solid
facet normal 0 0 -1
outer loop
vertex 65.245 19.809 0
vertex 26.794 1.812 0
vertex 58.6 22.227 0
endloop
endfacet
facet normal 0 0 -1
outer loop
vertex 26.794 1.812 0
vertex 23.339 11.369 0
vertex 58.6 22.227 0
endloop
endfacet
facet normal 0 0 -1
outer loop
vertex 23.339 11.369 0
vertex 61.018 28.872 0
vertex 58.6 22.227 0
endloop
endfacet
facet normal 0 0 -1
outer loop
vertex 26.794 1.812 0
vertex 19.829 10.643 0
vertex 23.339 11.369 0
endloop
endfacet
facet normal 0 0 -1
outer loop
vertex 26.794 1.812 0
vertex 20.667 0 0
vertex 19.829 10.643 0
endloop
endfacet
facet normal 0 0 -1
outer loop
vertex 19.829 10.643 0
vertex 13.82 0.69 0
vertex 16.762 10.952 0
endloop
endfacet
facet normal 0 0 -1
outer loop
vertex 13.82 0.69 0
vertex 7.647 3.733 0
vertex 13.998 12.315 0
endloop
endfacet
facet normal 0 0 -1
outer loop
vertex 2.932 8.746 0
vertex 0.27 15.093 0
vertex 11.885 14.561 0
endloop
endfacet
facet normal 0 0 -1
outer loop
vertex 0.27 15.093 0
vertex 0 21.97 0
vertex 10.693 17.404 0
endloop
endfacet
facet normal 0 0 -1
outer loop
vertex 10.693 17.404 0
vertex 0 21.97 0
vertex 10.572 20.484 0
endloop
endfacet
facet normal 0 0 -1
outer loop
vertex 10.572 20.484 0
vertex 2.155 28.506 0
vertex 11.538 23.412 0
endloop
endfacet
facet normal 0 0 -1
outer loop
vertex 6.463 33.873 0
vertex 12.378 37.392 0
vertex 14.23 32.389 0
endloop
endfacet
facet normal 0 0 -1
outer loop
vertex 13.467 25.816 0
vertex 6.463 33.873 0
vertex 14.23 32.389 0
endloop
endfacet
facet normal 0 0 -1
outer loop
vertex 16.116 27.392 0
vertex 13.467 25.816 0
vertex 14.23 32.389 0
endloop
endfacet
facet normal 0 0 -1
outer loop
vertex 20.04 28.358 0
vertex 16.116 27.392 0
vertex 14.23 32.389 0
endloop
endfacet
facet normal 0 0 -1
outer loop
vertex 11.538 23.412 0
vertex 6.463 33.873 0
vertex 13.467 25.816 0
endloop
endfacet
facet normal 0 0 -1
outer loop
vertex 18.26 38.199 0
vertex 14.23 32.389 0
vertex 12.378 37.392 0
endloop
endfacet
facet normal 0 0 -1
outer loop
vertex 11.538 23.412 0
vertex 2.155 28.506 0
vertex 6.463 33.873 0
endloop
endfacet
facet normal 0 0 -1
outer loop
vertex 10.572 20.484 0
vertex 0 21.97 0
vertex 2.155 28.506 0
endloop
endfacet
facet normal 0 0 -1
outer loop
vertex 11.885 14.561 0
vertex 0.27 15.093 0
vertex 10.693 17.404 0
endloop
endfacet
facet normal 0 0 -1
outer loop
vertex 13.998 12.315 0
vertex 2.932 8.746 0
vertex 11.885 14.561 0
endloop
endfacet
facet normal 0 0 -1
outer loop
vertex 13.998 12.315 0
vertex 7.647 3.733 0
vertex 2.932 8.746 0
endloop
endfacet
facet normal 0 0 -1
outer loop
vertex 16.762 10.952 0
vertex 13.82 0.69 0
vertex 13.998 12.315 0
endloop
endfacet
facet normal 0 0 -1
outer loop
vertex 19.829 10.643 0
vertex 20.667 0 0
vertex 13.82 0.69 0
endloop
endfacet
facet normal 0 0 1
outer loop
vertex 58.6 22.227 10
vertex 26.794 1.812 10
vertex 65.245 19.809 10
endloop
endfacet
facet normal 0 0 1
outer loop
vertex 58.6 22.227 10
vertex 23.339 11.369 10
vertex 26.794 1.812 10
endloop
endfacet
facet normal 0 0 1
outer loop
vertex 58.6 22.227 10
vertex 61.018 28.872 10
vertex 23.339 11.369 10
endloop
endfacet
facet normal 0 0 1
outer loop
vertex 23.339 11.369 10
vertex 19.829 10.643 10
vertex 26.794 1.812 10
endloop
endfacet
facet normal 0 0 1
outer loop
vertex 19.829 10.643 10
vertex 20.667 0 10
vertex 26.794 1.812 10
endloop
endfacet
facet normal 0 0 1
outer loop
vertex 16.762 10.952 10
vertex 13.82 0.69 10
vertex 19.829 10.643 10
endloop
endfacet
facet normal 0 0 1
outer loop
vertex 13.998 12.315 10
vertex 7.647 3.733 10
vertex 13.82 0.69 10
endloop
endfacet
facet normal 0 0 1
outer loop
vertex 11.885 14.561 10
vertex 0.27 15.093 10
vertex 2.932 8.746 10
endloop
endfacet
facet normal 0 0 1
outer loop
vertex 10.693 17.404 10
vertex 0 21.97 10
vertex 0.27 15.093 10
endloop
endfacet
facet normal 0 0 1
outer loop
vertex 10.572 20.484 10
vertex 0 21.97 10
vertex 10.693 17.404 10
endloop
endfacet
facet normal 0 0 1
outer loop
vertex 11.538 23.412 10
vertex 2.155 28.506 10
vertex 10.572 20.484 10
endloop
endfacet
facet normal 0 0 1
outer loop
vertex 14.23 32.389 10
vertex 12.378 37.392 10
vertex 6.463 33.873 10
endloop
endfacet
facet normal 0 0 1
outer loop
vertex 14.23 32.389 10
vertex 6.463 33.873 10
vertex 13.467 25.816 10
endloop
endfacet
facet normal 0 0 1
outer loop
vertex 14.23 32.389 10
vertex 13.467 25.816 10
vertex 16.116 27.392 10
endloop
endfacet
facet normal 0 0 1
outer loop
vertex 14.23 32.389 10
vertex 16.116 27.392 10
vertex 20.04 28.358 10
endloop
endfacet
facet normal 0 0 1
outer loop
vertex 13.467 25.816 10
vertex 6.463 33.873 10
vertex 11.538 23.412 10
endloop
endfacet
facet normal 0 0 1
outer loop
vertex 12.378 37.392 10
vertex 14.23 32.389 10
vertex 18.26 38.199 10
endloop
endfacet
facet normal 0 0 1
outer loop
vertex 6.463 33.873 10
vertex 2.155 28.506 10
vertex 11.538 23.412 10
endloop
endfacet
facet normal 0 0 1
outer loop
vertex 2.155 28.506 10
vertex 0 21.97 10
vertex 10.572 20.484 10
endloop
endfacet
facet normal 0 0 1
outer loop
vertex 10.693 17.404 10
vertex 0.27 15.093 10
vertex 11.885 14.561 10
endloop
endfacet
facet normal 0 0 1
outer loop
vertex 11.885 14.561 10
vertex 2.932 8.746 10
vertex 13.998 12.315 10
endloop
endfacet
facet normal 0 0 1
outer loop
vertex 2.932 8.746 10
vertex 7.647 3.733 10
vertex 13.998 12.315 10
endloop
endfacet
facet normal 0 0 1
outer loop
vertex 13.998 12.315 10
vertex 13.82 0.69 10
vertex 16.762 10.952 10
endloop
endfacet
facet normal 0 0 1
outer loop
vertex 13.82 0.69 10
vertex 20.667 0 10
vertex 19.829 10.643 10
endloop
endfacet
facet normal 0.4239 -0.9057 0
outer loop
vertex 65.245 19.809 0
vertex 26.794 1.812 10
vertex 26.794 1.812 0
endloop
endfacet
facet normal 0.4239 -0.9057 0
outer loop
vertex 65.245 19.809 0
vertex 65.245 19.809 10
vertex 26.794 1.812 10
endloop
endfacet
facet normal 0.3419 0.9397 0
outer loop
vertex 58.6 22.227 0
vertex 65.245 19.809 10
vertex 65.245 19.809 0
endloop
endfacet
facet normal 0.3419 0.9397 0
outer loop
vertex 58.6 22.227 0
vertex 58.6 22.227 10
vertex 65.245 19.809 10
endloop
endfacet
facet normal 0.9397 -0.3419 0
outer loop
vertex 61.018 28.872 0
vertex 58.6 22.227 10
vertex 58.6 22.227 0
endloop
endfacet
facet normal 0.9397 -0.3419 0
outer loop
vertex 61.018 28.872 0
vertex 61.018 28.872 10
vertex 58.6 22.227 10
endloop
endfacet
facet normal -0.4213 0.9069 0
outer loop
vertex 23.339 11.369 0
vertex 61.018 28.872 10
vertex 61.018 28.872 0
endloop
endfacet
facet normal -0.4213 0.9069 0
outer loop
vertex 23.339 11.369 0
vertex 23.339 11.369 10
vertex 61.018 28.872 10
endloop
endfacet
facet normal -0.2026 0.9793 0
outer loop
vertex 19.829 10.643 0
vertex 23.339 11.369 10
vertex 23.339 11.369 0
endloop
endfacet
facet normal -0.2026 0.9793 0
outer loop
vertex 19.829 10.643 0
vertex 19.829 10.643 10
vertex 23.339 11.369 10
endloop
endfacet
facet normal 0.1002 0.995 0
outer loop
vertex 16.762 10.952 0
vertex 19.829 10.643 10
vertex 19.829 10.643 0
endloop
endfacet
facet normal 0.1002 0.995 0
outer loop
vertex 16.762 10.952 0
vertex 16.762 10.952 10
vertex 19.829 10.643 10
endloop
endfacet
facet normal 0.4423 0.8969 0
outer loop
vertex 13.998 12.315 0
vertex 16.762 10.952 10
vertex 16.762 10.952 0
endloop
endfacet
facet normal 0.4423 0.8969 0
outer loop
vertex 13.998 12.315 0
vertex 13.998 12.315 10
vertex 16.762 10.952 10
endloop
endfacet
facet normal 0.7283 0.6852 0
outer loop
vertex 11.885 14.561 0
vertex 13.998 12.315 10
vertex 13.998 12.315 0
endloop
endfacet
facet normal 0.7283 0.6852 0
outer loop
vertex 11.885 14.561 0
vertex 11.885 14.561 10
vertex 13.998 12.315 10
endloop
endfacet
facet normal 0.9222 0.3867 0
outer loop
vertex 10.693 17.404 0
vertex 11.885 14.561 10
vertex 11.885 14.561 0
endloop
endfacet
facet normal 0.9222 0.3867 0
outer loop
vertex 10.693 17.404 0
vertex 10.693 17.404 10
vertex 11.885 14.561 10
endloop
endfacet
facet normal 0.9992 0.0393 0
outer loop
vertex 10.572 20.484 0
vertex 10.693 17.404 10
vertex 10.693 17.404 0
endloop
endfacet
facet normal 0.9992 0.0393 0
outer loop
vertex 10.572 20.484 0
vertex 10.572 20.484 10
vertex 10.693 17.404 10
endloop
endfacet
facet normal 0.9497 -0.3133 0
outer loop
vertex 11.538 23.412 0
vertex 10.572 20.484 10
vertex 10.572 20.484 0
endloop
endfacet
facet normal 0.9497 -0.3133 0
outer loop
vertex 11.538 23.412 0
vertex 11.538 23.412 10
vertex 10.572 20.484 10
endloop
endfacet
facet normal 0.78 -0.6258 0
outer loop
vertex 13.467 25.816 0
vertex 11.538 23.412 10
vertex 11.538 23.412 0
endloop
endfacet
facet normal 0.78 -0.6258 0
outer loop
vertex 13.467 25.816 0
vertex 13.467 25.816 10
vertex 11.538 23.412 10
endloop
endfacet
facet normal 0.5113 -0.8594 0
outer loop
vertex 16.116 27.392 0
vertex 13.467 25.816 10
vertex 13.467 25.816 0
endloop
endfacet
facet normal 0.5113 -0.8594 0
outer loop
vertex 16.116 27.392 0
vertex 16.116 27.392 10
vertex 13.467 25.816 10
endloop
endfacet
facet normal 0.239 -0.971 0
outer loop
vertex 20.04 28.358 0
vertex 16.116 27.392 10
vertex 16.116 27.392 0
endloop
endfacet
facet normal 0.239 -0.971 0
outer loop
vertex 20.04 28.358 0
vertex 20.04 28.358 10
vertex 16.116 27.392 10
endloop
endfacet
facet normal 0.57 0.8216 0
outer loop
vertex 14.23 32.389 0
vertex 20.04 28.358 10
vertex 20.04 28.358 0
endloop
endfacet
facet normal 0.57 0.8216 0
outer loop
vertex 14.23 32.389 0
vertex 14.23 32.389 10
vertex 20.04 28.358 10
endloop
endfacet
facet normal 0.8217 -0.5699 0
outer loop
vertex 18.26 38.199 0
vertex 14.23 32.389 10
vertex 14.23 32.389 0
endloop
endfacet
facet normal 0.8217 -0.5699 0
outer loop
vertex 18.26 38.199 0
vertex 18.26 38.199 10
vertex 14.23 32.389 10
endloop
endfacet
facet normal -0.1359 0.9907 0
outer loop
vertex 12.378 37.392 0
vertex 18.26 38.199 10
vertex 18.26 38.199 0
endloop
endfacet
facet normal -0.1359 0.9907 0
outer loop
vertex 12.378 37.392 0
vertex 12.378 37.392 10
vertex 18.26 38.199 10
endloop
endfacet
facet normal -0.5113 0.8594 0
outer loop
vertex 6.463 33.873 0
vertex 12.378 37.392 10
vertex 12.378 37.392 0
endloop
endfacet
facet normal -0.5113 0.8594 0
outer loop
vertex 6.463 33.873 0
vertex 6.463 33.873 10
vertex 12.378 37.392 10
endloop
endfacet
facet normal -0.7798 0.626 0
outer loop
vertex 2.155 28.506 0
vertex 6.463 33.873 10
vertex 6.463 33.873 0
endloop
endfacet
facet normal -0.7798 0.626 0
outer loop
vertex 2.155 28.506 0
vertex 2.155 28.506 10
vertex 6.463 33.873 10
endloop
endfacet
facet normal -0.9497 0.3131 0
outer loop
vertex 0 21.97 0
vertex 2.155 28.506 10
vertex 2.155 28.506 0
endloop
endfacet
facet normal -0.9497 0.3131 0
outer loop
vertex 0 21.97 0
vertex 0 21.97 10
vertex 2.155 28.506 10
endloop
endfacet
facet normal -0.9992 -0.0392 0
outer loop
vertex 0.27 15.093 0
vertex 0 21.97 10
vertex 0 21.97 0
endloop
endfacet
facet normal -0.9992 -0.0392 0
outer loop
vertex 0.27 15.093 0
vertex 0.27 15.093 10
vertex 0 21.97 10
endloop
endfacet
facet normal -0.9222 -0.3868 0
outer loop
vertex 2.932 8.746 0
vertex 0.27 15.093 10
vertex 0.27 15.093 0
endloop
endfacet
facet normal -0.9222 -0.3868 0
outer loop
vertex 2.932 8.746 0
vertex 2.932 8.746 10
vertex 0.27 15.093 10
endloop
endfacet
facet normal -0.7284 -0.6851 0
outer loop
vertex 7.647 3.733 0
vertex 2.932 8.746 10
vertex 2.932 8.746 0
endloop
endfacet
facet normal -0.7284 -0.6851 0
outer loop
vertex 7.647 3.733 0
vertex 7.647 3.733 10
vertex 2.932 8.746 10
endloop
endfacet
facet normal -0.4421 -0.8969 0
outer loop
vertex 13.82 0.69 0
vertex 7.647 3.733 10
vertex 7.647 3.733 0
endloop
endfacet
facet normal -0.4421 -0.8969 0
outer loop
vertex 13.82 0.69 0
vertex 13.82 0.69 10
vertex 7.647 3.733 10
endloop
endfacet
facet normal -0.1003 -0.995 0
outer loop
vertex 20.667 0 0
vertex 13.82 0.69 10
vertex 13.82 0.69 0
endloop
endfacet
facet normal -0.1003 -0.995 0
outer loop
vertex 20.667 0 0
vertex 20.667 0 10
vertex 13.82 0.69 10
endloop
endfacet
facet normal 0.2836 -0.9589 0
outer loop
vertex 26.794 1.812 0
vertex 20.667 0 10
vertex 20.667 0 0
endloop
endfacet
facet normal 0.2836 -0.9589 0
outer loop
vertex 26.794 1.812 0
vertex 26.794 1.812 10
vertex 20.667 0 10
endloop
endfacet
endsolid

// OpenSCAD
$fn = 32;

// ----------------------------------------------------------------------
// Hook plate: curl radius 14 mm over 205 degrees, 10 mm thick band
// ----------------------------------------------------------------------

// --- parameters (mm) ---
profile_height = 10;      // extrusion height
profile_points = 26;      // points of the closed outline

profile = [[14.23, 32.389], [18.26, 38.199], [12.378, 37.392], [6.463, 33.873], [2.155, 28.506], [0, 21.97], [0.27, 15.093], [2.932, 8.746], [7.647, 3.733], [13.82, 0.69], [20.667, 0], [26.794, 1.812], [65.245, 19.809], [58.6, 22.227], [61.018, 28.872], [23.339, 11.369], [19.829, 10.643], [16.762, 10.952], [13.998, 12.315], [11.885, 14.561], [10.693, 17.404], [10.572, 20.484], [11.538, 23.412], [13.467, 25.816], [16.116, 27.392], [20.04, 28.358]];  // single closed polygon, 26 points, counter clockwise

// --- the one profile operation ---
linear_extrude(height = profile_height) polygon(points = profile);
